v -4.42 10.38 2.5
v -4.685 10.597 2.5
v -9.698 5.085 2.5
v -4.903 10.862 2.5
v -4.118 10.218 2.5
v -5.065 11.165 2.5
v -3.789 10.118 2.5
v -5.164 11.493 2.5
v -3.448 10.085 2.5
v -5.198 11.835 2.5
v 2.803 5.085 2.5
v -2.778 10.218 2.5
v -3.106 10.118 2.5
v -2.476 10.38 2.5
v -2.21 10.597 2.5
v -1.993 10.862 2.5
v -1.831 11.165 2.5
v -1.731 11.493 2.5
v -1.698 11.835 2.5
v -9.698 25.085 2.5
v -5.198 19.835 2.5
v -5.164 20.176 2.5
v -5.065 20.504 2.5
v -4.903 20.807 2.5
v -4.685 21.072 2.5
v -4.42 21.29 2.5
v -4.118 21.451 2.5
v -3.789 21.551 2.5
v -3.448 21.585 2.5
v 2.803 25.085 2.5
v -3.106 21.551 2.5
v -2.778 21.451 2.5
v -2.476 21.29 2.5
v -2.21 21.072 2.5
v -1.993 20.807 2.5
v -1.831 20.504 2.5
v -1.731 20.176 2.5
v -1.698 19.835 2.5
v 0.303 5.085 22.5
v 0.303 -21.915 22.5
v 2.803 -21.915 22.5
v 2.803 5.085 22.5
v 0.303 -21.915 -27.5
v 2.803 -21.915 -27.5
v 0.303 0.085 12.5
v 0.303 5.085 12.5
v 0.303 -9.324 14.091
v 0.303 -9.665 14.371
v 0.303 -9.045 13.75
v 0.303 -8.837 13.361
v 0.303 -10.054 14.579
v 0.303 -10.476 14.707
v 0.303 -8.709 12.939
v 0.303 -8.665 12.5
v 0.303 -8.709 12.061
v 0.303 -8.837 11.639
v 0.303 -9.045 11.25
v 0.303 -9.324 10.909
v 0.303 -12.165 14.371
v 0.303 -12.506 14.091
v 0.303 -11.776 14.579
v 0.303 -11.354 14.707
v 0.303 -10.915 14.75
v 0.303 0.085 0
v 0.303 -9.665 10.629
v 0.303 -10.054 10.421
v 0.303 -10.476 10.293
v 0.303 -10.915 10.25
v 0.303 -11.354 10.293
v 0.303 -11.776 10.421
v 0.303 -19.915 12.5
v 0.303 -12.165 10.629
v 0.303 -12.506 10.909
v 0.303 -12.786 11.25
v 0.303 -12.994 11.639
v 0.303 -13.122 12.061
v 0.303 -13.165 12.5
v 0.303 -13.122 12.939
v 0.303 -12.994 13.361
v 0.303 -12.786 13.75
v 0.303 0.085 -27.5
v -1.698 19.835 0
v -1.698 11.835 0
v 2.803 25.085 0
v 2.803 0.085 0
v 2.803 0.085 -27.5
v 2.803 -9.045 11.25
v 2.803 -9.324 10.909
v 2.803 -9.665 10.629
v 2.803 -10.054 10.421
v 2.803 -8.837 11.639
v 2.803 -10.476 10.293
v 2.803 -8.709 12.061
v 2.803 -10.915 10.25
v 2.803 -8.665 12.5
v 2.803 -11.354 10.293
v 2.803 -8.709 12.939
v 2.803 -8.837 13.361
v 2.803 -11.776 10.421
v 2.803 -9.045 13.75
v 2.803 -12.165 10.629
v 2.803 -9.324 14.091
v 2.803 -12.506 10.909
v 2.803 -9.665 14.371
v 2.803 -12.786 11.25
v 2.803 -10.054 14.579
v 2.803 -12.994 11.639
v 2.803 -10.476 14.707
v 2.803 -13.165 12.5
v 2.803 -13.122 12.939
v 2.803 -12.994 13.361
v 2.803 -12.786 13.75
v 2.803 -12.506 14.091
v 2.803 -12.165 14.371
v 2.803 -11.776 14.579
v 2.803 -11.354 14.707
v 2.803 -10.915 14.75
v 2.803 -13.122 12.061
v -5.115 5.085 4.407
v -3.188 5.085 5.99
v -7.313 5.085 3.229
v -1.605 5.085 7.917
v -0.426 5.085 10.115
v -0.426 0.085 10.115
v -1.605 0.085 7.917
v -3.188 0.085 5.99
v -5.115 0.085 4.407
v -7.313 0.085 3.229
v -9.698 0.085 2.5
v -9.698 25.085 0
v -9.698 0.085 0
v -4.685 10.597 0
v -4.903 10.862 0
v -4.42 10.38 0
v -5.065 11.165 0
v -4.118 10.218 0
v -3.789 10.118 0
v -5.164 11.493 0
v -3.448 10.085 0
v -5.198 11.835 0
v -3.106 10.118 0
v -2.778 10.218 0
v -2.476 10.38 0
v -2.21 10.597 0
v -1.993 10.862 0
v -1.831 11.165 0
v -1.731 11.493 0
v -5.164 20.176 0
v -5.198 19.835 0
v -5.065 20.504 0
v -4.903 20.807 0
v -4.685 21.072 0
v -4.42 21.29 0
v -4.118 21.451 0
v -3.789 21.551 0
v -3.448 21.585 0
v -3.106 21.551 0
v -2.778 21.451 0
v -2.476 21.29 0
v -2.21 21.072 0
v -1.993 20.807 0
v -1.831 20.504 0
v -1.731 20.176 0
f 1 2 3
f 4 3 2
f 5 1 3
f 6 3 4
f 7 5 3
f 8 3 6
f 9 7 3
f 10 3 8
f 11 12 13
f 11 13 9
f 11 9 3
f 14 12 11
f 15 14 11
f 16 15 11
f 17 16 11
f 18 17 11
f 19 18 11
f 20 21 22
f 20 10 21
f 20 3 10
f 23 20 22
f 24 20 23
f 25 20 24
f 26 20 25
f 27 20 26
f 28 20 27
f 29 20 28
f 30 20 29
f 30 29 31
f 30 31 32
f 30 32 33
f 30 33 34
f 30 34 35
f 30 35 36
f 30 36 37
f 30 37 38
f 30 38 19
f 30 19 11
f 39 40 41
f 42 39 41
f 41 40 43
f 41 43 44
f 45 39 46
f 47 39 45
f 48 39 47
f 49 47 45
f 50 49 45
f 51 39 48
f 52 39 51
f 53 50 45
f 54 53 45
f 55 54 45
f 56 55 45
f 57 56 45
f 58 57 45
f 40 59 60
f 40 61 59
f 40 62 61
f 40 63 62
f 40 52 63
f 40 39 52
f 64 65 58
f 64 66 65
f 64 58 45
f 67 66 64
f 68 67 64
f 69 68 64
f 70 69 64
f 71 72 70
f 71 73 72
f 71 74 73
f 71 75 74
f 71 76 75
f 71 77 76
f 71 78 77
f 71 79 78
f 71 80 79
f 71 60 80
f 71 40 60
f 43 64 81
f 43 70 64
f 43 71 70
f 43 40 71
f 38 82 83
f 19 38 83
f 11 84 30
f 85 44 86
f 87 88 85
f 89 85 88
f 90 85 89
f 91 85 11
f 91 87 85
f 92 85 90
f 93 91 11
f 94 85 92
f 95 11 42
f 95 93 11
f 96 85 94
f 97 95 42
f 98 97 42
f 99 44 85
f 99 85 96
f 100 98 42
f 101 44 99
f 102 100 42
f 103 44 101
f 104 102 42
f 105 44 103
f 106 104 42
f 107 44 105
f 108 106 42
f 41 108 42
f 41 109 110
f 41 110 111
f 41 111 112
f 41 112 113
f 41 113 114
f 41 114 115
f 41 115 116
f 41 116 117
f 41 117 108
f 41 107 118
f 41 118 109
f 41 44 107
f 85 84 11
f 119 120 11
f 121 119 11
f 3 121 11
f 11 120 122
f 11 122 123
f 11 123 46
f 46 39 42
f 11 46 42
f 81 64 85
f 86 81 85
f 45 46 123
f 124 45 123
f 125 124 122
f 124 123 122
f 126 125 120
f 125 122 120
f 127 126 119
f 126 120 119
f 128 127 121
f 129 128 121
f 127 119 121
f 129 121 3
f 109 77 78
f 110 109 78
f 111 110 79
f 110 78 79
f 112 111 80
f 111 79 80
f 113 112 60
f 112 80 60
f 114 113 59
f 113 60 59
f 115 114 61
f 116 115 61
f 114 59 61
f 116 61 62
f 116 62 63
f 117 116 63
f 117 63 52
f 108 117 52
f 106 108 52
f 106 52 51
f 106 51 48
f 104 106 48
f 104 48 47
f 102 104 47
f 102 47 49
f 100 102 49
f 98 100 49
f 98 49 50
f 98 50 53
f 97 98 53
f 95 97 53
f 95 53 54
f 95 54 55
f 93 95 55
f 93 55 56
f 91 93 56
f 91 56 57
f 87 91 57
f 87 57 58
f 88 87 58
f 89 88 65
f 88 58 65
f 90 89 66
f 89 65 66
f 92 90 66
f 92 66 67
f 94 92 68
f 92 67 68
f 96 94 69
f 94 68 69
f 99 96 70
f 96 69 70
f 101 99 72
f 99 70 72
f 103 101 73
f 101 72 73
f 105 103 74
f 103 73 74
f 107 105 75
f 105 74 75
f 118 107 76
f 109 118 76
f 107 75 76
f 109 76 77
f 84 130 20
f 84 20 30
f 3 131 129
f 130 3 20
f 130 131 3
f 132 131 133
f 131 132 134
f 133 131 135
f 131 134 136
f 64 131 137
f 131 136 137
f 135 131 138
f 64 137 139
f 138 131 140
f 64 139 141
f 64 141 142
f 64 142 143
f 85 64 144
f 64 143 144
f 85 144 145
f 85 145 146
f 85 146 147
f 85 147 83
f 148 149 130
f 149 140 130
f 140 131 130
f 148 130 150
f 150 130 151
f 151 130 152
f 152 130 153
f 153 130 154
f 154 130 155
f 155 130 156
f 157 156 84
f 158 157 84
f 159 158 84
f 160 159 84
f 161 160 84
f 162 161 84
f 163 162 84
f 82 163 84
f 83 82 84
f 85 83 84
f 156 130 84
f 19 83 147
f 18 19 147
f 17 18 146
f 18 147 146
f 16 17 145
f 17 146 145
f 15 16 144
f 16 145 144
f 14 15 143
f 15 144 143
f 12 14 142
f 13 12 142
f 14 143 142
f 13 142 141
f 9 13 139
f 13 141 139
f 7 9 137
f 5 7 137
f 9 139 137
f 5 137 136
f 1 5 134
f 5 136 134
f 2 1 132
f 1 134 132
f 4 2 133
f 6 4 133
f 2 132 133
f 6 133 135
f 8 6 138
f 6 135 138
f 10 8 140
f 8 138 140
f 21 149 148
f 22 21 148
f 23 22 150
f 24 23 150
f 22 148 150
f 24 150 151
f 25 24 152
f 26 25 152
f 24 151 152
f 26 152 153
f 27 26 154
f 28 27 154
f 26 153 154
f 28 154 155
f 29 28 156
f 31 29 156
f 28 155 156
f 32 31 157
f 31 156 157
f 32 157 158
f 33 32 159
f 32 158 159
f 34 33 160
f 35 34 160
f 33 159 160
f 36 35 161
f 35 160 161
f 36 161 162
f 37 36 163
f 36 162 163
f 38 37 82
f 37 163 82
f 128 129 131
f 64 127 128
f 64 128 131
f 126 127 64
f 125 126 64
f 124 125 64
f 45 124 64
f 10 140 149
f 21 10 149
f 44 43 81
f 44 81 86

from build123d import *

# Parameters (mm, degrees)
F0_W      = 12.5012692667
F0_H      = 25
F1_DEPTH  = 2.5
F2_W      = 2.5
F2_H      = 20
F2_H_2    = 2.5
F2_H_3    = 27.5
F3_DEPTH  = 22
F4_DEPTH  = 5
F5_R      = 2.25
F6_DEPTH  = 25
F9_DEPTH  = 5
F11_DEPTH = 25


with BuildPart() as f1:
    # F0 (on Top) → F1 (new body)
    with BuildSketch(Plane.XY):
        with Locations((-3.4478325397, 12.5846065283)):
            Rectangle(F0_W, F0_H)
        with BuildLine():
            Line((-1.6978325397, 19.8346065283), (-1.6978325397, 11.8346065283))
            ThreePointArc((-1.6978325397, 11.8346065283), (-3.4478325397, 10.0846065283), (-5.1978325397, 11.8346065283))
            Line((-5.1978325397, 11.8346065283), (-5.1978325397, 19.8346065283))
            ThreePointArc((-5.1978325397, 19.8346065489), (-3.4478325254, 21.5846065283), (-1.6978325397, 19.8346065205))
        make_face(mode=Mode.SUBTRACT)
    extrude(amount=F1_DEPTH)

    # F2 (on face) → F3 (join)
    with BuildSketch(Plane.XZ.offset(-0.0846065283)):
        with Locations((1.5528020937, 12.5)):
            Rectangle(F2_W, F2_H)
        with Locations((1.5528020937, 1.25)):
            Rectangle(F2_W, F2_H_2)
        with Locations((1.5528020937, -13.75)):
            Rectangle(F2_W, F2_H_3)
    extrude(amount=F3_DEPTH)

    # F4 (add): a face of the model
    f4_faces = [f1.faces().sort_by_distance(p)[0] for p in [
        (1.5528020937, 0.0846065283, 12.5),
    ]]
    extrude(f4_faces, amount=F4_DEPTH)

    # F5 (on face) → F6 (cut)
    with BuildSketch(Plane(origin=(0.3028020937, 0, 0), x_dir=(0, -1, 0), z_dir=(-1, 0, 0))):
        with Locations((10.9153934717, 12.5)):
            Circle(F5_R)
    extrude(amount=-F6_DEPTH, mode=Mode.SUBTRACT)

    # F8 (on offset) → F9 (join)
    with BuildSketch(Plane.XZ.offset(-0.0846065283)):
        Polygon((0.3028020937, 12.5), (-9.698467173, 2.5), (0.3028020937, 2.5), align=None)
    extrude(amount=-F9_DEPTH)

    # F10 (on face) → F11 (cut)
    with BuildSketch(Plane(origin=(0, 5.0846065283, 0), x_dir=(-1, 0, 0), z_dir=(0, 1, 0))):
        with BuildLine():
            Line((9.698467173, 2.5), (-0.3028020937, 12.5))
            ThreePointArc((-0.3028020937, 12.5), (3.1881480162, 5.9901238573), (9.698467173, 2.5))
        make_face()
    extrude(amount=-F11_DEPTH, mode=Mode.SUBTRACT)


solid = f1.part
